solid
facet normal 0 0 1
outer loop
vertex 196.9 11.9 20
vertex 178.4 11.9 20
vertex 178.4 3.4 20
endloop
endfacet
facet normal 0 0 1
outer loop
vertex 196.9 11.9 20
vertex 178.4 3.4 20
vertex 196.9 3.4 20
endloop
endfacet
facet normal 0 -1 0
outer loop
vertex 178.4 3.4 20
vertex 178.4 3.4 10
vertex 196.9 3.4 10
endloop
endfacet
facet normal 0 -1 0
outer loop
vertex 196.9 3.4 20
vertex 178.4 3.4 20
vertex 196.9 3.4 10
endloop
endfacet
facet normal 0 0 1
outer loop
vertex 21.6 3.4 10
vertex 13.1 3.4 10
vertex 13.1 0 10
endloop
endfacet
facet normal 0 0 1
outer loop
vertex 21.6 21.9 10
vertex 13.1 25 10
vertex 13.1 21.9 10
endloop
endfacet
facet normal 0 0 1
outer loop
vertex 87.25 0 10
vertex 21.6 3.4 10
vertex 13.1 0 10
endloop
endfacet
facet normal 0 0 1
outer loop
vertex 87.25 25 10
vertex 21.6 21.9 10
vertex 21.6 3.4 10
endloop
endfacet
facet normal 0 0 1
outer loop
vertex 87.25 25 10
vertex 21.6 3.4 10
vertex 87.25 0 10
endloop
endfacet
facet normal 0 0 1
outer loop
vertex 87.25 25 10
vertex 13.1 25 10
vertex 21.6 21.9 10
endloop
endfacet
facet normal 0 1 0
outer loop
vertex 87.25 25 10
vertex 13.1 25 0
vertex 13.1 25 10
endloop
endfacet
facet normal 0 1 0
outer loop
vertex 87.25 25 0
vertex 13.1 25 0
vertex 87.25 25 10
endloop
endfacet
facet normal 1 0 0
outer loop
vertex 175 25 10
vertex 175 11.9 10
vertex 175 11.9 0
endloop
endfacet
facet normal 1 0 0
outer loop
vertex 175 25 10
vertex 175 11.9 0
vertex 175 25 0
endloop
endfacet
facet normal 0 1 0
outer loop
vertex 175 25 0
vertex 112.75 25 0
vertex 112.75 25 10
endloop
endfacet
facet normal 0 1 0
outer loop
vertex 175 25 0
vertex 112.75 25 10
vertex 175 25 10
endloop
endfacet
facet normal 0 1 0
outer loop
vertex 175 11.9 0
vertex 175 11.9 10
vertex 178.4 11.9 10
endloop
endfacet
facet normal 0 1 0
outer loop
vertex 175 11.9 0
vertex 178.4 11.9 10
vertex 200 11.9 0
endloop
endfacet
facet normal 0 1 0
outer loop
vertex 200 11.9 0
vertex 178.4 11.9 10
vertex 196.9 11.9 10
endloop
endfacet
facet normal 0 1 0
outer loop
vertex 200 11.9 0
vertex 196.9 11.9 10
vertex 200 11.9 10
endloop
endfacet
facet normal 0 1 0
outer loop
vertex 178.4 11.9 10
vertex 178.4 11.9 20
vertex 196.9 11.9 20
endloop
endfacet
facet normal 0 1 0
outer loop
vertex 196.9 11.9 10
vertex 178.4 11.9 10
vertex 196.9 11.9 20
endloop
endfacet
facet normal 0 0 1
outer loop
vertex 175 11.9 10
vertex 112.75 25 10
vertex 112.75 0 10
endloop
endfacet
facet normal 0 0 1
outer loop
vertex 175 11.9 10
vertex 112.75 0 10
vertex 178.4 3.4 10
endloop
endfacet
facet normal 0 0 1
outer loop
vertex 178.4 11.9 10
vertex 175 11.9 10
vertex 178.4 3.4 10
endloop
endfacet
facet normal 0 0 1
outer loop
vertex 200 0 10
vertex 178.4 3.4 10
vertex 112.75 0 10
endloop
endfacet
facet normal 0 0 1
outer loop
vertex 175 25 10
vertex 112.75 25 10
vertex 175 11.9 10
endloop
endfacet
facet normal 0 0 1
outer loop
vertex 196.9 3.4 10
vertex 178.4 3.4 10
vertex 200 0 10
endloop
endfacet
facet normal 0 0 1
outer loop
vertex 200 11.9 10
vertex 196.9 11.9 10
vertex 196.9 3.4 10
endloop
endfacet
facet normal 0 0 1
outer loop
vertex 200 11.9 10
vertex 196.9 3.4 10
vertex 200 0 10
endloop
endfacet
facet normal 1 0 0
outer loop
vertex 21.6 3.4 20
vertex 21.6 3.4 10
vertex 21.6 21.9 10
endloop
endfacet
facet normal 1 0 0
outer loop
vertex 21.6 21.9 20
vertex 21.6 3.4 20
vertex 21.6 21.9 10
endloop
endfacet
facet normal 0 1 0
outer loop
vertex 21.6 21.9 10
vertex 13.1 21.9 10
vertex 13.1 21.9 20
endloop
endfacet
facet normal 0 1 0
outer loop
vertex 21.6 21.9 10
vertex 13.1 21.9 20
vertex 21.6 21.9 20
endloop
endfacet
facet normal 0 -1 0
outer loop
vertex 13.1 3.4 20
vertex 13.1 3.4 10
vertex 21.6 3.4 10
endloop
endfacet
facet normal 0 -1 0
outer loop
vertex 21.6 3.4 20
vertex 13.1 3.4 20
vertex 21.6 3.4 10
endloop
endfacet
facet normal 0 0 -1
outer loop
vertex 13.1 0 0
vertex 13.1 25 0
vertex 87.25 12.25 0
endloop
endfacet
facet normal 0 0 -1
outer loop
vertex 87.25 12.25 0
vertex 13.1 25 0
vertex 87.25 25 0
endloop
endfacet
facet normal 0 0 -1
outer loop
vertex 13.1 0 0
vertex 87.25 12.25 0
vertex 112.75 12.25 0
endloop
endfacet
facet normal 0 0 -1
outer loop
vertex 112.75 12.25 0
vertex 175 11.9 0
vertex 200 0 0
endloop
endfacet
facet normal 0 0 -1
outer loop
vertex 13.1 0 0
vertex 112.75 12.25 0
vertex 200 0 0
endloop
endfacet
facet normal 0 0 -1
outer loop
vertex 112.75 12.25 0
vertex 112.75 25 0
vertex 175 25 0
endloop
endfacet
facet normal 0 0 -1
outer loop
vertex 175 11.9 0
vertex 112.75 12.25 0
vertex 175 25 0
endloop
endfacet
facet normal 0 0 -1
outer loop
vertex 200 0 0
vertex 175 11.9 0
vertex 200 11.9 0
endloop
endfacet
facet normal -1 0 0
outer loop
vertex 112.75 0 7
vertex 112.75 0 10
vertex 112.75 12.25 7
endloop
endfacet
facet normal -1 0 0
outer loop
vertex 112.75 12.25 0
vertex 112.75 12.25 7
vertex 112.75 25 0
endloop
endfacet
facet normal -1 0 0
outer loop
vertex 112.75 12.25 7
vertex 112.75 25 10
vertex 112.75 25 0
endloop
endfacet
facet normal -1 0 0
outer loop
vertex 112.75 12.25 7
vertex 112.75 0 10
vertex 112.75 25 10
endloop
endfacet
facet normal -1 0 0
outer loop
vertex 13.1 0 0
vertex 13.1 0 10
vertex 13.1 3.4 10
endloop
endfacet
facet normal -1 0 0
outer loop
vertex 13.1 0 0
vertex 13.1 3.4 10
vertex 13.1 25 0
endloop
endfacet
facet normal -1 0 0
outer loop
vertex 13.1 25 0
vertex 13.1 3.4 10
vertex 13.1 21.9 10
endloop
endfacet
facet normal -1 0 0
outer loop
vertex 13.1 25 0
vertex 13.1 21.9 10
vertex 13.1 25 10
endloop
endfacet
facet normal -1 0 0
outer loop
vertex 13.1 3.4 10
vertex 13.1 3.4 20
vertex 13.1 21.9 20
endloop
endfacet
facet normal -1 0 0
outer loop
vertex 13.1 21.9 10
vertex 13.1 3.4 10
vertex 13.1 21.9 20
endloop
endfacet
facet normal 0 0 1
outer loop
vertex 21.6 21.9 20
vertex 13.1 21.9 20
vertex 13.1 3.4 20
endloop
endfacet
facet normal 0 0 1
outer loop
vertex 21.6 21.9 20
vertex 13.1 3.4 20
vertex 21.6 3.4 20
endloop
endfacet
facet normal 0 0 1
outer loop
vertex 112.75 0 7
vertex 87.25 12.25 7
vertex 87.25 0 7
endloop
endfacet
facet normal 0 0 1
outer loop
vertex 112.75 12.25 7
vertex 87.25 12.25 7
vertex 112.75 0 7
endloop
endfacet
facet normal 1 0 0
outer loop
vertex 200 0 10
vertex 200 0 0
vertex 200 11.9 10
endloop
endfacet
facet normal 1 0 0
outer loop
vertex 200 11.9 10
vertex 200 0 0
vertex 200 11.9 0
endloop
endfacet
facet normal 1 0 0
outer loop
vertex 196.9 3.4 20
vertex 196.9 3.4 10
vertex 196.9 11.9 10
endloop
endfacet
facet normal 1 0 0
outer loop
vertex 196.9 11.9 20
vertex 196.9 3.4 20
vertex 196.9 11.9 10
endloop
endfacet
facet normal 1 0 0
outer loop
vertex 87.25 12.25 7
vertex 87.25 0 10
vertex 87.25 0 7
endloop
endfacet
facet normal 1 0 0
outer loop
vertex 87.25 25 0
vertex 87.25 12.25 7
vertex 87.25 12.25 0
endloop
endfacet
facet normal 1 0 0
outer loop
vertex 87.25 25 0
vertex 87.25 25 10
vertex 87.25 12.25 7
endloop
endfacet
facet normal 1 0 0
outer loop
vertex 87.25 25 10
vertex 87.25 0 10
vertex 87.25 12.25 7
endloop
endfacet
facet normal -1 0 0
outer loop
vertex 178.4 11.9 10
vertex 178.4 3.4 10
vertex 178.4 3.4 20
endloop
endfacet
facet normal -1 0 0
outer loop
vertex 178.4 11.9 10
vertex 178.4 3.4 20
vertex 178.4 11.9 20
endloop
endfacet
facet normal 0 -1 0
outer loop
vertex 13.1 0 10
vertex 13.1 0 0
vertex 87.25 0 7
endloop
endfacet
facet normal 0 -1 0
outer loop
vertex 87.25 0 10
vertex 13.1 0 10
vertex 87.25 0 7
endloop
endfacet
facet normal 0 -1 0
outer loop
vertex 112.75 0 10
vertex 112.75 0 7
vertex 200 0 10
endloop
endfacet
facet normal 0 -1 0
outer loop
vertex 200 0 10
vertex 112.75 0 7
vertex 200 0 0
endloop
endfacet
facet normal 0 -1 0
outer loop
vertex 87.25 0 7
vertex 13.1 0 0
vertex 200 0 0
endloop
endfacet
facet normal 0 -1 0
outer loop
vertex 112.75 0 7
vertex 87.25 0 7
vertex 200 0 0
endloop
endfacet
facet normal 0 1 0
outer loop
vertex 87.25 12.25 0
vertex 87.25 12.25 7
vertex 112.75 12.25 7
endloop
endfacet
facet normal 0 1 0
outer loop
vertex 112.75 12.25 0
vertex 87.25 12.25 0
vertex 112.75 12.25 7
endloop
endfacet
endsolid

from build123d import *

# Parameters (mm, degrees)
SKETCH1_W           = 200
SKETCH1_H           = 25
BOSS_EXTRUDE1_DEPTH = 10
SKETCH4_W           = 25.5
SKETCH4_H           = 25.5
CUT_EXTRUDE2_DEPTH  = 10
SKETCH2_W           = 18.5
SKETCH2_H           = 8.5
SKETCH2_W_2         = 8.5
SKETCH2_H_2         = 18.5
BOSS_EXTRUDE3_DEPTH = 10
SKETCH3_W           = 13.1
SKETCH3_H           = 25
SKETCH3_W_2         = 25
SKETCH3_H_2         = 13.1
CUT_EXTRUDE3_DEPTH  = 10
SKETCH5_W           = 25.5
SKETCH5_H           = 3
CUT_EXTRUDE4_DEPTH  = 13


with BuildPart() as part:
    # Sketch1 → Boss-Extrude1 (new body)
    with BuildSketch(Plane.XY):
        with Locations((100, 12.5)):
            Rectangle(SKETCH1_W, SKETCH1_H)
    extrude(amount=BOSS_EXTRUDE1_DEPTH)

    # Sketch4 → Cut-Extrude2 (cut)
    with BuildSketch(Plane.XY.offset(10)):
        with Locations((100, 25)):
            Rectangle(SKETCH4_W, SKETCH4_H)
    extrude(amount=-CUT_EXTRUDE2_DEPTH, mode=Mode.SUBTRACT)

    # Sketch2 → Boss-Extrude3 (add)
    with BuildSketch(Plane.XY.offset(10)):
        with Locations((187.65, 7.65)):
            Rectangle(SKETCH2_W, SKETCH2_H)
        with Locations((17.35, 12.65)):
            Rectangle(SKETCH2_W_2, SKETCH2_H_2)
    extrude(amount=BOSS_EXTRUDE3_DEPTH)

    # Sketch3 → Cut-Extrude3 (cut)
    with BuildSketch(Plane.XY.offset(10)):
        with Locations((6.55, 12.5)):
            Rectangle(SKETCH3_W, SKETCH3_H)
        with Locations((187.5, 18.45)):
            Rectangle(SKETCH3_W_2, SKETCH3_H_2)
    extrude(amount=-CUT_EXTRUDE3_DEPTH, mode=Mode.SUBTRACT)

    # Sketch5 → Cut-Extrude4 (cut)
    with BuildSketch(Plane(origin=(0, 12.25, 0), x_dir=(1, 0, 0), z_dir=(0, 1, 0))):
        with Locations((100, -8.5)):
            Rectangle(SKETCH5_W, SKETCH5_H)
    extrude(amount=-CUT_EXTRUDE4_DEPTH, mode=Mode.SUBTRACT)


solid = part.part
